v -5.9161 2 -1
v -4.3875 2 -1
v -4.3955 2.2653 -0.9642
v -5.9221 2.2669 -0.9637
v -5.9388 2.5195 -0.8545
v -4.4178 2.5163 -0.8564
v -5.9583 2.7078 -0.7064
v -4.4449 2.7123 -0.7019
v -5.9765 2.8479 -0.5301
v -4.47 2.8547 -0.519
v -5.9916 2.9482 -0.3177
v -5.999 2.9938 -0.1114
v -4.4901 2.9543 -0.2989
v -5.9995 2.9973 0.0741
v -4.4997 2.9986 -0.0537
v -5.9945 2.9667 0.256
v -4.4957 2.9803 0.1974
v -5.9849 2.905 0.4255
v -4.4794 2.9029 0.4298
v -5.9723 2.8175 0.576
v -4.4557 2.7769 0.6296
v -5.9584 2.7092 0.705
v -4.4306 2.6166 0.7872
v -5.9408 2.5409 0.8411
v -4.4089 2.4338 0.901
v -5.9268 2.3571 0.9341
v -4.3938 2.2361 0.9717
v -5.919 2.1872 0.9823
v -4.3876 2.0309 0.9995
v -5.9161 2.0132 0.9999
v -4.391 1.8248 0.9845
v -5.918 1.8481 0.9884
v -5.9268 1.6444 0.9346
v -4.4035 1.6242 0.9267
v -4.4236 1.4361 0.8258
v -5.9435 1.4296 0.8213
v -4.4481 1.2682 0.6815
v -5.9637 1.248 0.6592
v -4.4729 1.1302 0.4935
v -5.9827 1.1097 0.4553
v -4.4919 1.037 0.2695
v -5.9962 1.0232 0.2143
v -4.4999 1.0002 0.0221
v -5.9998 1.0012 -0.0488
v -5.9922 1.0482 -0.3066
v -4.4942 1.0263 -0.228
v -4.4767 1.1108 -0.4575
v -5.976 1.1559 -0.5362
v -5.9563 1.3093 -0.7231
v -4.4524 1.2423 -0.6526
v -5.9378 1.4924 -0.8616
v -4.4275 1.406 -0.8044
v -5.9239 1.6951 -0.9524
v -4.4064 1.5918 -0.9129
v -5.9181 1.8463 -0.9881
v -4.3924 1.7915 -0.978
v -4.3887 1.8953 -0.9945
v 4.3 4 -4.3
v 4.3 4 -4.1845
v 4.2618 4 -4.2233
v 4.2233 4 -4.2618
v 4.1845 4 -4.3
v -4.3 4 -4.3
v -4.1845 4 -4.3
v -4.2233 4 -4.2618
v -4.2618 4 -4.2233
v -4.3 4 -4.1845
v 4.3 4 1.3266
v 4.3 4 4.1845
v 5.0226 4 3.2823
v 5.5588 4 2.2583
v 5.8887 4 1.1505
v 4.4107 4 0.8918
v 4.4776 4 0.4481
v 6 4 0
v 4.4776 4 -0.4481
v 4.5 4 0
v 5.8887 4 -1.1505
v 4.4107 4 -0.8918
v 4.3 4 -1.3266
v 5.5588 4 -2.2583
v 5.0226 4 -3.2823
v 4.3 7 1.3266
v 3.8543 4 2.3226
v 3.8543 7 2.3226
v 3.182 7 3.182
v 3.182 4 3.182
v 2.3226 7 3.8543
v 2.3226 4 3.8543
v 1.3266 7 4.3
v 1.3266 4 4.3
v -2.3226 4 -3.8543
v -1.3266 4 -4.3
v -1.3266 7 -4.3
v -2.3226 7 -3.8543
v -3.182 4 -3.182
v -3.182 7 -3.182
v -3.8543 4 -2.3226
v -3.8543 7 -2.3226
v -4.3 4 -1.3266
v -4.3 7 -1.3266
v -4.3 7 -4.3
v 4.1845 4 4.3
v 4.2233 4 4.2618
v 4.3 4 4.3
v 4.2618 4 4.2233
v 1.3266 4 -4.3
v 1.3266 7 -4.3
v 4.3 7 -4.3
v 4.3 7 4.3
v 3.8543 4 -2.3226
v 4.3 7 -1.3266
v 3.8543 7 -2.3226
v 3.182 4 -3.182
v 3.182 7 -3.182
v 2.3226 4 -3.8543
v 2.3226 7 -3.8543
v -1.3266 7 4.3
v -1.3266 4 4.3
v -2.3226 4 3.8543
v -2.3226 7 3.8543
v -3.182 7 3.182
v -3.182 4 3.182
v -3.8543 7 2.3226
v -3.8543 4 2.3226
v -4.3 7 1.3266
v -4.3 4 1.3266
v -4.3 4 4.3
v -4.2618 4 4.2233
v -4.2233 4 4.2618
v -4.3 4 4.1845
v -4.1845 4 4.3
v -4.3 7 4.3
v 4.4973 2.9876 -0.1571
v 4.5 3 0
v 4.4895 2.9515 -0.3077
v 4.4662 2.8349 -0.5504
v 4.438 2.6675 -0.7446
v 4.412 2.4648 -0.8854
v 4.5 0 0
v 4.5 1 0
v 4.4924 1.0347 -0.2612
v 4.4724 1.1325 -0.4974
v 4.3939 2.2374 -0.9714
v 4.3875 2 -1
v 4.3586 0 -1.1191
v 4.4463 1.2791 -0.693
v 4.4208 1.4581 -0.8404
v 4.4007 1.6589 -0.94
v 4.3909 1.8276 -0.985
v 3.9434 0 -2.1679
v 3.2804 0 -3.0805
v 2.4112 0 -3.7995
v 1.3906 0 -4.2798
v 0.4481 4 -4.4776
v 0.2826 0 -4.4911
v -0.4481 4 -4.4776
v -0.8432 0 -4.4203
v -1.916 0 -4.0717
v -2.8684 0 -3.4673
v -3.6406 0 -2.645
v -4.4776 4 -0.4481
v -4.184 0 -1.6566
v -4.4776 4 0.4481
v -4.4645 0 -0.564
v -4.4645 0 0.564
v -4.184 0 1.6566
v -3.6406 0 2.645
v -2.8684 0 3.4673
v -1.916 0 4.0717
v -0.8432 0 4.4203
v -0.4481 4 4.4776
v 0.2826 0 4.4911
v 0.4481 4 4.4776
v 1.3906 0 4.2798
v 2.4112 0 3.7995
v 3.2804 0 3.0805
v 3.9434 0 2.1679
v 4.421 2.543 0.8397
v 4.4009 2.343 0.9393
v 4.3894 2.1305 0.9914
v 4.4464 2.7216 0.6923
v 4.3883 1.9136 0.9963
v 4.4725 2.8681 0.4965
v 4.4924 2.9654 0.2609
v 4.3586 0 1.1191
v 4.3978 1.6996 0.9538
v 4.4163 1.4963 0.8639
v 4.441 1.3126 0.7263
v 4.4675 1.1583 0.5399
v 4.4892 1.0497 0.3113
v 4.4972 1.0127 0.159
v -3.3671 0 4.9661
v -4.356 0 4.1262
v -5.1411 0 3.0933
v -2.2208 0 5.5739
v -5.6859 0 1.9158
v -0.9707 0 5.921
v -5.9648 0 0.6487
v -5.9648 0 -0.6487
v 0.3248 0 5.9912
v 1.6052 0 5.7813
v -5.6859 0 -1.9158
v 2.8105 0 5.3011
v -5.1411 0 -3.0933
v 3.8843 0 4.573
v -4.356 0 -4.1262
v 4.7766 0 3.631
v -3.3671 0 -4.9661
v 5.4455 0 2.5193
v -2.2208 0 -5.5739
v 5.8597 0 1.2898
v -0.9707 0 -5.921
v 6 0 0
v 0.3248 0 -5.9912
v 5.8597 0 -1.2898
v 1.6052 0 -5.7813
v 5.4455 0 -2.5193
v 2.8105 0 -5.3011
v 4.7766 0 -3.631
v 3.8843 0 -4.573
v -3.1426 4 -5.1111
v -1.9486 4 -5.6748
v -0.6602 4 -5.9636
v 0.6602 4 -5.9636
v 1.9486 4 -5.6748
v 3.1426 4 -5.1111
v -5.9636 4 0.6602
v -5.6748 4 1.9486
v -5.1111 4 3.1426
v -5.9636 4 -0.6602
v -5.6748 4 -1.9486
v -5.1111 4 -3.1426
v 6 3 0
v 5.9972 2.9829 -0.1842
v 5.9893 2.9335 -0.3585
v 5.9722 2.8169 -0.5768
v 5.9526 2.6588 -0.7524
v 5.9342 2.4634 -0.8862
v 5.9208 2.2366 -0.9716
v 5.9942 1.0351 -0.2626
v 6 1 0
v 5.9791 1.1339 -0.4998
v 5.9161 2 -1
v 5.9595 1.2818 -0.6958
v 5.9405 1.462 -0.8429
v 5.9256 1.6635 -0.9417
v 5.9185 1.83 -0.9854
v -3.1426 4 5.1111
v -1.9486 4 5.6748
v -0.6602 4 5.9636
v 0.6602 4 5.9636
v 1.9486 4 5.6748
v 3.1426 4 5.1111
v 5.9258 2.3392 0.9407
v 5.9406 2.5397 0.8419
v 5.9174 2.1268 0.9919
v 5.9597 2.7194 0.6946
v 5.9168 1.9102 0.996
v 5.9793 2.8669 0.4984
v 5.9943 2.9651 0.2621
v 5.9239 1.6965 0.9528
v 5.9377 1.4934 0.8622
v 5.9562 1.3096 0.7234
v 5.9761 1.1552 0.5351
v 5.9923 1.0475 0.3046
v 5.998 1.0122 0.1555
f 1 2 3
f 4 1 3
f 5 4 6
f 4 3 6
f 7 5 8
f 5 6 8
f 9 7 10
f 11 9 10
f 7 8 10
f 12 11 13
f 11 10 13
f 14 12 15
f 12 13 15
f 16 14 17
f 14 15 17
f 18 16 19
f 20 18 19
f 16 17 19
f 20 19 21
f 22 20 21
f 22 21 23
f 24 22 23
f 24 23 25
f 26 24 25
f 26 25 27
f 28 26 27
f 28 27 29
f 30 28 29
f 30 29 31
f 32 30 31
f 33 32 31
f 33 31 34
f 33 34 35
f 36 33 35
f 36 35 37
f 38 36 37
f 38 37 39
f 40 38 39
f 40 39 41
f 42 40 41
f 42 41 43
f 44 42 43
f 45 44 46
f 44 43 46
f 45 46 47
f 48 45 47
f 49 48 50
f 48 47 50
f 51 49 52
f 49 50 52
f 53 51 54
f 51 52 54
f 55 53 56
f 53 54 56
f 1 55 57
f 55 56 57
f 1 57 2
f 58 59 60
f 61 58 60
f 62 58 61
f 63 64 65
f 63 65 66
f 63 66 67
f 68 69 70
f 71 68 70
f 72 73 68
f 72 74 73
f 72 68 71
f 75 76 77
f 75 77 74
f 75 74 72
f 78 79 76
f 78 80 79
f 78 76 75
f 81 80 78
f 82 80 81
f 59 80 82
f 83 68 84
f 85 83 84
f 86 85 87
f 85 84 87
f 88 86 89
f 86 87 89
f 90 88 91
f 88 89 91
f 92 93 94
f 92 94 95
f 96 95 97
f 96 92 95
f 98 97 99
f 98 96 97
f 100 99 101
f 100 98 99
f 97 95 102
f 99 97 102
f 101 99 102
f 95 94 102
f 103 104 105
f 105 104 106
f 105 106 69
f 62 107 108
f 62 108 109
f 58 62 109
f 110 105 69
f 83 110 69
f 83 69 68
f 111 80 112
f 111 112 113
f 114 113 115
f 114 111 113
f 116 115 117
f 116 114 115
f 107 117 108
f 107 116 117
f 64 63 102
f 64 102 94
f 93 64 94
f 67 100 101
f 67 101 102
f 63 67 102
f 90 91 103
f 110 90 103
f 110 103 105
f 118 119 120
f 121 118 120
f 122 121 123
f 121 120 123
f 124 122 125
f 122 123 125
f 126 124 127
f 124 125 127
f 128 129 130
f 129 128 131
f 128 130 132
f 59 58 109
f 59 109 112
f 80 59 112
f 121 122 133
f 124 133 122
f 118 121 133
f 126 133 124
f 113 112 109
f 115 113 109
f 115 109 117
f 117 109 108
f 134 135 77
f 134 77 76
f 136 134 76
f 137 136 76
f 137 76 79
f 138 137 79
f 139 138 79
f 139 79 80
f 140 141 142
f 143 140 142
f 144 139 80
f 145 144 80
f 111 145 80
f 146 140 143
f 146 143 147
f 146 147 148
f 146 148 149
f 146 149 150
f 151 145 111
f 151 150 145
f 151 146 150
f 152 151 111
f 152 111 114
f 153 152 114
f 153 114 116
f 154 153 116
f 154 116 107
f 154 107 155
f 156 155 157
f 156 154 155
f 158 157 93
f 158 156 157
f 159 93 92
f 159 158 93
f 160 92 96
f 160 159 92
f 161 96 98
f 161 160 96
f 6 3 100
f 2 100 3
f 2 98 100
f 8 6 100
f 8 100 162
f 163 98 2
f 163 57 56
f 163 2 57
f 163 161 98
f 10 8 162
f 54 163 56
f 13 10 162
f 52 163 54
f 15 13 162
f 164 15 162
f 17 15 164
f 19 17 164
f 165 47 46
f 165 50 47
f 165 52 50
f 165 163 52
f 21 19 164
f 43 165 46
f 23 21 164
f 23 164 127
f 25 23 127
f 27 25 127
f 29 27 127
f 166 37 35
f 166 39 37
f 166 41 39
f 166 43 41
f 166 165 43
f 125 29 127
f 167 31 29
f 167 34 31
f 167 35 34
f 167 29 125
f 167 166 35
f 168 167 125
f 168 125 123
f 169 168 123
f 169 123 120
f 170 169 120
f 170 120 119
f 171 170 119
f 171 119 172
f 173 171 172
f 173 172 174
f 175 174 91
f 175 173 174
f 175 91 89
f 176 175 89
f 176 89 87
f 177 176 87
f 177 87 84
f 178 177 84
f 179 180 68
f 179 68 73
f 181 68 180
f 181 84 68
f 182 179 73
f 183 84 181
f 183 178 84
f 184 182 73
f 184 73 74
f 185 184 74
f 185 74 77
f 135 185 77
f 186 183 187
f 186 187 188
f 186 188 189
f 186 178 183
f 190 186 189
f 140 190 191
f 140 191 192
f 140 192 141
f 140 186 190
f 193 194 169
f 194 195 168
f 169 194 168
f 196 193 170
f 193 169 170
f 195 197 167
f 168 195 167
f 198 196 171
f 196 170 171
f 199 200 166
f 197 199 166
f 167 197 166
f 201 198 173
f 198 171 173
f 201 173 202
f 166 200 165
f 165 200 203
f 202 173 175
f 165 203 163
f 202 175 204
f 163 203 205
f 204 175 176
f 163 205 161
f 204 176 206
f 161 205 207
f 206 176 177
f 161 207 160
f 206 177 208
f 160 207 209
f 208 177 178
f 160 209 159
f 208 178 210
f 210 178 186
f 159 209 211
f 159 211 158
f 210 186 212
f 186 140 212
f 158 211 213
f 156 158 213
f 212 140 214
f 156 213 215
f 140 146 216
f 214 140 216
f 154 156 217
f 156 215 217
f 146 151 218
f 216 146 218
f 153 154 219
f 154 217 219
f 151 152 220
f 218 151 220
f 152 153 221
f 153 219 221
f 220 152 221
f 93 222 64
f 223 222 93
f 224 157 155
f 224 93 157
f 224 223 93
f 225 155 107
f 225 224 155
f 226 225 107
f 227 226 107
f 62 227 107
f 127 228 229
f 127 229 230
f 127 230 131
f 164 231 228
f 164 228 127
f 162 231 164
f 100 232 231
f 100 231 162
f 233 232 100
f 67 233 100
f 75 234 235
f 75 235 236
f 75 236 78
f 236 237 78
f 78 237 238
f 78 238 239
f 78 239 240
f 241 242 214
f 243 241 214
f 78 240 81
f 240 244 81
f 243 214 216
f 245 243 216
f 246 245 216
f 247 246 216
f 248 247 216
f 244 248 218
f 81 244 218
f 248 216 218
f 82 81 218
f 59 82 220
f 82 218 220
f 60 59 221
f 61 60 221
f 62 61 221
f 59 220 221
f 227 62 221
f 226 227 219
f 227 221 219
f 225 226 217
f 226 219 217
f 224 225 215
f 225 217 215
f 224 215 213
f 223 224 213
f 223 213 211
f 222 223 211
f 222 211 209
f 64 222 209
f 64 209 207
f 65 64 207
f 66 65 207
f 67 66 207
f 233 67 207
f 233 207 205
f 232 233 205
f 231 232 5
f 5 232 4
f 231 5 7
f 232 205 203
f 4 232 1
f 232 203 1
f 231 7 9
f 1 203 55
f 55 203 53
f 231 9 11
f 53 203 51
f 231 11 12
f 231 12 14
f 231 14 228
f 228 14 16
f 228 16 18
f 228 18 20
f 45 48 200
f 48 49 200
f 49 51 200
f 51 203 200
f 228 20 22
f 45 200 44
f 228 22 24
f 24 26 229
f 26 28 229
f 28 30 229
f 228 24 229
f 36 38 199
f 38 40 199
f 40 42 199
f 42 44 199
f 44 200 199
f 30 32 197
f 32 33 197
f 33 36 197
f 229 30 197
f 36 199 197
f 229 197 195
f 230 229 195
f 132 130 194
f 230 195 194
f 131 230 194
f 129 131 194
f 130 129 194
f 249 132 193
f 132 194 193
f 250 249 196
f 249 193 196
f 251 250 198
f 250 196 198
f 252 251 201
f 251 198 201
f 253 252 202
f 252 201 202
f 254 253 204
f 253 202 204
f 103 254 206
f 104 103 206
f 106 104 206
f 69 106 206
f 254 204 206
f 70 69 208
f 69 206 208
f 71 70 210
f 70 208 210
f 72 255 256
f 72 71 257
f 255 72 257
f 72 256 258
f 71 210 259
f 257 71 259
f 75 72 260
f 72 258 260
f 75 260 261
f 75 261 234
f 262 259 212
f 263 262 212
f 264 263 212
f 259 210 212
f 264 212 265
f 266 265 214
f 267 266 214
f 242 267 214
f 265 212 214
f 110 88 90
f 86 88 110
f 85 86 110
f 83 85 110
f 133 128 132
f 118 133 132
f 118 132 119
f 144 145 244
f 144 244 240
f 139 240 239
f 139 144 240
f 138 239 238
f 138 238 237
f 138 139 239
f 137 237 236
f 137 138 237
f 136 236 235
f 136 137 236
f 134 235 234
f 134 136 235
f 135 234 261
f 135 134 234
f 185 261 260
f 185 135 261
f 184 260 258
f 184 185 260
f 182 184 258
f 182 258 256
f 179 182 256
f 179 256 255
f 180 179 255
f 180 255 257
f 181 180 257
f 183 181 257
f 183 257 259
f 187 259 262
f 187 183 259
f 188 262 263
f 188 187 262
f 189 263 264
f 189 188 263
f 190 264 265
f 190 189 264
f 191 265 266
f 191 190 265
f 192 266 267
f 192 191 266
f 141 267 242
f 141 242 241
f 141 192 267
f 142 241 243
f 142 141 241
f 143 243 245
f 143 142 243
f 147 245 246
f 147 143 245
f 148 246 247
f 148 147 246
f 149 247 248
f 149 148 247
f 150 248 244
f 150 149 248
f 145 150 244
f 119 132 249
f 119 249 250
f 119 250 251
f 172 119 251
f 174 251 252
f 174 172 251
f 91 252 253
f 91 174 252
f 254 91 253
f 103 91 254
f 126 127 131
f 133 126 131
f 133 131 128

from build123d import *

# Parameters (mm, degrees)
SKETCH1_R               = 6
SKETCH1_R_2             = 4.5
BOSS_EXTRUDE5_DEPTH     = 4
BOSS_EXTRUDE6_DEPTH     = 3
SKETCH4_R               = 1
CUT_EXTRUDE1_DEPTH      = 7
CUT_EXTRUDE1_DEPTH_BACK = 7


with BuildPart() as part:
    # Sketch1 → Boss-Extrude5 (new body)
    with BuildSketch(Plane(origin=(0, 0, 0), x_dir=(1, 0, 0), z_dir=(0, 1, 0))):
        Circle(SKETCH1_R)
        Circle(SKETCH1_R_2, mode=Mode.SUBTRACT)
    extrude(amount=BOSS_EXTRUDE5_DEPTH)

    # Sketch3 → Boss-Extrude6 (add)
    with BuildSketch(Plane(origin=(0, 4, 0), x_dir=(1, 0, 0), z_dir=(0, 1, 0))):
        with BuildLine():
            Line((1.326649916, 4.3), (4.3, 4.3))
            Line((4.3, 4.3), (4.3, 1.326649916))
            ThreePointArc((4.3, 1.326649916), (3.181980515, 3.181980515), (1.326649916, 4.3))
        make_face()
        with BuildLine():
            Line((-4.3, -4.3), (-1.326649916, -4.3))
            ThreePointArc((-1.326649916, -4.3), (-3.181980515, -3.181980515), (-4.3, -1.326649916))
            Line((-4.3, -1.326649916), (-4.3, -4.3))
        make_face()
        with BuildLine():
            Line((-4.3, 4.3), (-1.326649916, 4.3))
            ThreePointArc((-1.326649916, 4.3), (-3.181980515, 3.181980515), (-4.3, 1.326649916))
            Line((-4.3, 1.326649916), (-4.3, 4.3))
        make_face()
        with BuildLine():
            Line((4.3, -4.3), (4.3, -1.326649916))
            ThreePointArc((4.3, -1.326649916), (3.181980515, -3.181980515), (1.326649916, -4.3))
            Line((1.326649916, -4.3), (4.3, -4.3))
        make_face()
    extrude(amount=BOSS_EXTRUDE6_DEPTH)

    # Sketch4 → Cut-Extrude1 (cut, two sides)
    with BuildSketch(Plane(origin=(0, 0, 0), x_dir=(0, 0, -1), z_dir=(1, 0, 0))) as cut_extrude1_sk:
        with Locations((0, 2)):
            Circle(SKETCH4_R)
    extrude(amount=CUT_EXTRUDE1_DEPTH, mode=Mode.SUBTRACT)
    extrude(cut_extrude1_sk.sketch, amount=-CUT_EXTRUDE1_DEPTH_BACK, mode=Mode.SUBTRACT)


solid = part.part
